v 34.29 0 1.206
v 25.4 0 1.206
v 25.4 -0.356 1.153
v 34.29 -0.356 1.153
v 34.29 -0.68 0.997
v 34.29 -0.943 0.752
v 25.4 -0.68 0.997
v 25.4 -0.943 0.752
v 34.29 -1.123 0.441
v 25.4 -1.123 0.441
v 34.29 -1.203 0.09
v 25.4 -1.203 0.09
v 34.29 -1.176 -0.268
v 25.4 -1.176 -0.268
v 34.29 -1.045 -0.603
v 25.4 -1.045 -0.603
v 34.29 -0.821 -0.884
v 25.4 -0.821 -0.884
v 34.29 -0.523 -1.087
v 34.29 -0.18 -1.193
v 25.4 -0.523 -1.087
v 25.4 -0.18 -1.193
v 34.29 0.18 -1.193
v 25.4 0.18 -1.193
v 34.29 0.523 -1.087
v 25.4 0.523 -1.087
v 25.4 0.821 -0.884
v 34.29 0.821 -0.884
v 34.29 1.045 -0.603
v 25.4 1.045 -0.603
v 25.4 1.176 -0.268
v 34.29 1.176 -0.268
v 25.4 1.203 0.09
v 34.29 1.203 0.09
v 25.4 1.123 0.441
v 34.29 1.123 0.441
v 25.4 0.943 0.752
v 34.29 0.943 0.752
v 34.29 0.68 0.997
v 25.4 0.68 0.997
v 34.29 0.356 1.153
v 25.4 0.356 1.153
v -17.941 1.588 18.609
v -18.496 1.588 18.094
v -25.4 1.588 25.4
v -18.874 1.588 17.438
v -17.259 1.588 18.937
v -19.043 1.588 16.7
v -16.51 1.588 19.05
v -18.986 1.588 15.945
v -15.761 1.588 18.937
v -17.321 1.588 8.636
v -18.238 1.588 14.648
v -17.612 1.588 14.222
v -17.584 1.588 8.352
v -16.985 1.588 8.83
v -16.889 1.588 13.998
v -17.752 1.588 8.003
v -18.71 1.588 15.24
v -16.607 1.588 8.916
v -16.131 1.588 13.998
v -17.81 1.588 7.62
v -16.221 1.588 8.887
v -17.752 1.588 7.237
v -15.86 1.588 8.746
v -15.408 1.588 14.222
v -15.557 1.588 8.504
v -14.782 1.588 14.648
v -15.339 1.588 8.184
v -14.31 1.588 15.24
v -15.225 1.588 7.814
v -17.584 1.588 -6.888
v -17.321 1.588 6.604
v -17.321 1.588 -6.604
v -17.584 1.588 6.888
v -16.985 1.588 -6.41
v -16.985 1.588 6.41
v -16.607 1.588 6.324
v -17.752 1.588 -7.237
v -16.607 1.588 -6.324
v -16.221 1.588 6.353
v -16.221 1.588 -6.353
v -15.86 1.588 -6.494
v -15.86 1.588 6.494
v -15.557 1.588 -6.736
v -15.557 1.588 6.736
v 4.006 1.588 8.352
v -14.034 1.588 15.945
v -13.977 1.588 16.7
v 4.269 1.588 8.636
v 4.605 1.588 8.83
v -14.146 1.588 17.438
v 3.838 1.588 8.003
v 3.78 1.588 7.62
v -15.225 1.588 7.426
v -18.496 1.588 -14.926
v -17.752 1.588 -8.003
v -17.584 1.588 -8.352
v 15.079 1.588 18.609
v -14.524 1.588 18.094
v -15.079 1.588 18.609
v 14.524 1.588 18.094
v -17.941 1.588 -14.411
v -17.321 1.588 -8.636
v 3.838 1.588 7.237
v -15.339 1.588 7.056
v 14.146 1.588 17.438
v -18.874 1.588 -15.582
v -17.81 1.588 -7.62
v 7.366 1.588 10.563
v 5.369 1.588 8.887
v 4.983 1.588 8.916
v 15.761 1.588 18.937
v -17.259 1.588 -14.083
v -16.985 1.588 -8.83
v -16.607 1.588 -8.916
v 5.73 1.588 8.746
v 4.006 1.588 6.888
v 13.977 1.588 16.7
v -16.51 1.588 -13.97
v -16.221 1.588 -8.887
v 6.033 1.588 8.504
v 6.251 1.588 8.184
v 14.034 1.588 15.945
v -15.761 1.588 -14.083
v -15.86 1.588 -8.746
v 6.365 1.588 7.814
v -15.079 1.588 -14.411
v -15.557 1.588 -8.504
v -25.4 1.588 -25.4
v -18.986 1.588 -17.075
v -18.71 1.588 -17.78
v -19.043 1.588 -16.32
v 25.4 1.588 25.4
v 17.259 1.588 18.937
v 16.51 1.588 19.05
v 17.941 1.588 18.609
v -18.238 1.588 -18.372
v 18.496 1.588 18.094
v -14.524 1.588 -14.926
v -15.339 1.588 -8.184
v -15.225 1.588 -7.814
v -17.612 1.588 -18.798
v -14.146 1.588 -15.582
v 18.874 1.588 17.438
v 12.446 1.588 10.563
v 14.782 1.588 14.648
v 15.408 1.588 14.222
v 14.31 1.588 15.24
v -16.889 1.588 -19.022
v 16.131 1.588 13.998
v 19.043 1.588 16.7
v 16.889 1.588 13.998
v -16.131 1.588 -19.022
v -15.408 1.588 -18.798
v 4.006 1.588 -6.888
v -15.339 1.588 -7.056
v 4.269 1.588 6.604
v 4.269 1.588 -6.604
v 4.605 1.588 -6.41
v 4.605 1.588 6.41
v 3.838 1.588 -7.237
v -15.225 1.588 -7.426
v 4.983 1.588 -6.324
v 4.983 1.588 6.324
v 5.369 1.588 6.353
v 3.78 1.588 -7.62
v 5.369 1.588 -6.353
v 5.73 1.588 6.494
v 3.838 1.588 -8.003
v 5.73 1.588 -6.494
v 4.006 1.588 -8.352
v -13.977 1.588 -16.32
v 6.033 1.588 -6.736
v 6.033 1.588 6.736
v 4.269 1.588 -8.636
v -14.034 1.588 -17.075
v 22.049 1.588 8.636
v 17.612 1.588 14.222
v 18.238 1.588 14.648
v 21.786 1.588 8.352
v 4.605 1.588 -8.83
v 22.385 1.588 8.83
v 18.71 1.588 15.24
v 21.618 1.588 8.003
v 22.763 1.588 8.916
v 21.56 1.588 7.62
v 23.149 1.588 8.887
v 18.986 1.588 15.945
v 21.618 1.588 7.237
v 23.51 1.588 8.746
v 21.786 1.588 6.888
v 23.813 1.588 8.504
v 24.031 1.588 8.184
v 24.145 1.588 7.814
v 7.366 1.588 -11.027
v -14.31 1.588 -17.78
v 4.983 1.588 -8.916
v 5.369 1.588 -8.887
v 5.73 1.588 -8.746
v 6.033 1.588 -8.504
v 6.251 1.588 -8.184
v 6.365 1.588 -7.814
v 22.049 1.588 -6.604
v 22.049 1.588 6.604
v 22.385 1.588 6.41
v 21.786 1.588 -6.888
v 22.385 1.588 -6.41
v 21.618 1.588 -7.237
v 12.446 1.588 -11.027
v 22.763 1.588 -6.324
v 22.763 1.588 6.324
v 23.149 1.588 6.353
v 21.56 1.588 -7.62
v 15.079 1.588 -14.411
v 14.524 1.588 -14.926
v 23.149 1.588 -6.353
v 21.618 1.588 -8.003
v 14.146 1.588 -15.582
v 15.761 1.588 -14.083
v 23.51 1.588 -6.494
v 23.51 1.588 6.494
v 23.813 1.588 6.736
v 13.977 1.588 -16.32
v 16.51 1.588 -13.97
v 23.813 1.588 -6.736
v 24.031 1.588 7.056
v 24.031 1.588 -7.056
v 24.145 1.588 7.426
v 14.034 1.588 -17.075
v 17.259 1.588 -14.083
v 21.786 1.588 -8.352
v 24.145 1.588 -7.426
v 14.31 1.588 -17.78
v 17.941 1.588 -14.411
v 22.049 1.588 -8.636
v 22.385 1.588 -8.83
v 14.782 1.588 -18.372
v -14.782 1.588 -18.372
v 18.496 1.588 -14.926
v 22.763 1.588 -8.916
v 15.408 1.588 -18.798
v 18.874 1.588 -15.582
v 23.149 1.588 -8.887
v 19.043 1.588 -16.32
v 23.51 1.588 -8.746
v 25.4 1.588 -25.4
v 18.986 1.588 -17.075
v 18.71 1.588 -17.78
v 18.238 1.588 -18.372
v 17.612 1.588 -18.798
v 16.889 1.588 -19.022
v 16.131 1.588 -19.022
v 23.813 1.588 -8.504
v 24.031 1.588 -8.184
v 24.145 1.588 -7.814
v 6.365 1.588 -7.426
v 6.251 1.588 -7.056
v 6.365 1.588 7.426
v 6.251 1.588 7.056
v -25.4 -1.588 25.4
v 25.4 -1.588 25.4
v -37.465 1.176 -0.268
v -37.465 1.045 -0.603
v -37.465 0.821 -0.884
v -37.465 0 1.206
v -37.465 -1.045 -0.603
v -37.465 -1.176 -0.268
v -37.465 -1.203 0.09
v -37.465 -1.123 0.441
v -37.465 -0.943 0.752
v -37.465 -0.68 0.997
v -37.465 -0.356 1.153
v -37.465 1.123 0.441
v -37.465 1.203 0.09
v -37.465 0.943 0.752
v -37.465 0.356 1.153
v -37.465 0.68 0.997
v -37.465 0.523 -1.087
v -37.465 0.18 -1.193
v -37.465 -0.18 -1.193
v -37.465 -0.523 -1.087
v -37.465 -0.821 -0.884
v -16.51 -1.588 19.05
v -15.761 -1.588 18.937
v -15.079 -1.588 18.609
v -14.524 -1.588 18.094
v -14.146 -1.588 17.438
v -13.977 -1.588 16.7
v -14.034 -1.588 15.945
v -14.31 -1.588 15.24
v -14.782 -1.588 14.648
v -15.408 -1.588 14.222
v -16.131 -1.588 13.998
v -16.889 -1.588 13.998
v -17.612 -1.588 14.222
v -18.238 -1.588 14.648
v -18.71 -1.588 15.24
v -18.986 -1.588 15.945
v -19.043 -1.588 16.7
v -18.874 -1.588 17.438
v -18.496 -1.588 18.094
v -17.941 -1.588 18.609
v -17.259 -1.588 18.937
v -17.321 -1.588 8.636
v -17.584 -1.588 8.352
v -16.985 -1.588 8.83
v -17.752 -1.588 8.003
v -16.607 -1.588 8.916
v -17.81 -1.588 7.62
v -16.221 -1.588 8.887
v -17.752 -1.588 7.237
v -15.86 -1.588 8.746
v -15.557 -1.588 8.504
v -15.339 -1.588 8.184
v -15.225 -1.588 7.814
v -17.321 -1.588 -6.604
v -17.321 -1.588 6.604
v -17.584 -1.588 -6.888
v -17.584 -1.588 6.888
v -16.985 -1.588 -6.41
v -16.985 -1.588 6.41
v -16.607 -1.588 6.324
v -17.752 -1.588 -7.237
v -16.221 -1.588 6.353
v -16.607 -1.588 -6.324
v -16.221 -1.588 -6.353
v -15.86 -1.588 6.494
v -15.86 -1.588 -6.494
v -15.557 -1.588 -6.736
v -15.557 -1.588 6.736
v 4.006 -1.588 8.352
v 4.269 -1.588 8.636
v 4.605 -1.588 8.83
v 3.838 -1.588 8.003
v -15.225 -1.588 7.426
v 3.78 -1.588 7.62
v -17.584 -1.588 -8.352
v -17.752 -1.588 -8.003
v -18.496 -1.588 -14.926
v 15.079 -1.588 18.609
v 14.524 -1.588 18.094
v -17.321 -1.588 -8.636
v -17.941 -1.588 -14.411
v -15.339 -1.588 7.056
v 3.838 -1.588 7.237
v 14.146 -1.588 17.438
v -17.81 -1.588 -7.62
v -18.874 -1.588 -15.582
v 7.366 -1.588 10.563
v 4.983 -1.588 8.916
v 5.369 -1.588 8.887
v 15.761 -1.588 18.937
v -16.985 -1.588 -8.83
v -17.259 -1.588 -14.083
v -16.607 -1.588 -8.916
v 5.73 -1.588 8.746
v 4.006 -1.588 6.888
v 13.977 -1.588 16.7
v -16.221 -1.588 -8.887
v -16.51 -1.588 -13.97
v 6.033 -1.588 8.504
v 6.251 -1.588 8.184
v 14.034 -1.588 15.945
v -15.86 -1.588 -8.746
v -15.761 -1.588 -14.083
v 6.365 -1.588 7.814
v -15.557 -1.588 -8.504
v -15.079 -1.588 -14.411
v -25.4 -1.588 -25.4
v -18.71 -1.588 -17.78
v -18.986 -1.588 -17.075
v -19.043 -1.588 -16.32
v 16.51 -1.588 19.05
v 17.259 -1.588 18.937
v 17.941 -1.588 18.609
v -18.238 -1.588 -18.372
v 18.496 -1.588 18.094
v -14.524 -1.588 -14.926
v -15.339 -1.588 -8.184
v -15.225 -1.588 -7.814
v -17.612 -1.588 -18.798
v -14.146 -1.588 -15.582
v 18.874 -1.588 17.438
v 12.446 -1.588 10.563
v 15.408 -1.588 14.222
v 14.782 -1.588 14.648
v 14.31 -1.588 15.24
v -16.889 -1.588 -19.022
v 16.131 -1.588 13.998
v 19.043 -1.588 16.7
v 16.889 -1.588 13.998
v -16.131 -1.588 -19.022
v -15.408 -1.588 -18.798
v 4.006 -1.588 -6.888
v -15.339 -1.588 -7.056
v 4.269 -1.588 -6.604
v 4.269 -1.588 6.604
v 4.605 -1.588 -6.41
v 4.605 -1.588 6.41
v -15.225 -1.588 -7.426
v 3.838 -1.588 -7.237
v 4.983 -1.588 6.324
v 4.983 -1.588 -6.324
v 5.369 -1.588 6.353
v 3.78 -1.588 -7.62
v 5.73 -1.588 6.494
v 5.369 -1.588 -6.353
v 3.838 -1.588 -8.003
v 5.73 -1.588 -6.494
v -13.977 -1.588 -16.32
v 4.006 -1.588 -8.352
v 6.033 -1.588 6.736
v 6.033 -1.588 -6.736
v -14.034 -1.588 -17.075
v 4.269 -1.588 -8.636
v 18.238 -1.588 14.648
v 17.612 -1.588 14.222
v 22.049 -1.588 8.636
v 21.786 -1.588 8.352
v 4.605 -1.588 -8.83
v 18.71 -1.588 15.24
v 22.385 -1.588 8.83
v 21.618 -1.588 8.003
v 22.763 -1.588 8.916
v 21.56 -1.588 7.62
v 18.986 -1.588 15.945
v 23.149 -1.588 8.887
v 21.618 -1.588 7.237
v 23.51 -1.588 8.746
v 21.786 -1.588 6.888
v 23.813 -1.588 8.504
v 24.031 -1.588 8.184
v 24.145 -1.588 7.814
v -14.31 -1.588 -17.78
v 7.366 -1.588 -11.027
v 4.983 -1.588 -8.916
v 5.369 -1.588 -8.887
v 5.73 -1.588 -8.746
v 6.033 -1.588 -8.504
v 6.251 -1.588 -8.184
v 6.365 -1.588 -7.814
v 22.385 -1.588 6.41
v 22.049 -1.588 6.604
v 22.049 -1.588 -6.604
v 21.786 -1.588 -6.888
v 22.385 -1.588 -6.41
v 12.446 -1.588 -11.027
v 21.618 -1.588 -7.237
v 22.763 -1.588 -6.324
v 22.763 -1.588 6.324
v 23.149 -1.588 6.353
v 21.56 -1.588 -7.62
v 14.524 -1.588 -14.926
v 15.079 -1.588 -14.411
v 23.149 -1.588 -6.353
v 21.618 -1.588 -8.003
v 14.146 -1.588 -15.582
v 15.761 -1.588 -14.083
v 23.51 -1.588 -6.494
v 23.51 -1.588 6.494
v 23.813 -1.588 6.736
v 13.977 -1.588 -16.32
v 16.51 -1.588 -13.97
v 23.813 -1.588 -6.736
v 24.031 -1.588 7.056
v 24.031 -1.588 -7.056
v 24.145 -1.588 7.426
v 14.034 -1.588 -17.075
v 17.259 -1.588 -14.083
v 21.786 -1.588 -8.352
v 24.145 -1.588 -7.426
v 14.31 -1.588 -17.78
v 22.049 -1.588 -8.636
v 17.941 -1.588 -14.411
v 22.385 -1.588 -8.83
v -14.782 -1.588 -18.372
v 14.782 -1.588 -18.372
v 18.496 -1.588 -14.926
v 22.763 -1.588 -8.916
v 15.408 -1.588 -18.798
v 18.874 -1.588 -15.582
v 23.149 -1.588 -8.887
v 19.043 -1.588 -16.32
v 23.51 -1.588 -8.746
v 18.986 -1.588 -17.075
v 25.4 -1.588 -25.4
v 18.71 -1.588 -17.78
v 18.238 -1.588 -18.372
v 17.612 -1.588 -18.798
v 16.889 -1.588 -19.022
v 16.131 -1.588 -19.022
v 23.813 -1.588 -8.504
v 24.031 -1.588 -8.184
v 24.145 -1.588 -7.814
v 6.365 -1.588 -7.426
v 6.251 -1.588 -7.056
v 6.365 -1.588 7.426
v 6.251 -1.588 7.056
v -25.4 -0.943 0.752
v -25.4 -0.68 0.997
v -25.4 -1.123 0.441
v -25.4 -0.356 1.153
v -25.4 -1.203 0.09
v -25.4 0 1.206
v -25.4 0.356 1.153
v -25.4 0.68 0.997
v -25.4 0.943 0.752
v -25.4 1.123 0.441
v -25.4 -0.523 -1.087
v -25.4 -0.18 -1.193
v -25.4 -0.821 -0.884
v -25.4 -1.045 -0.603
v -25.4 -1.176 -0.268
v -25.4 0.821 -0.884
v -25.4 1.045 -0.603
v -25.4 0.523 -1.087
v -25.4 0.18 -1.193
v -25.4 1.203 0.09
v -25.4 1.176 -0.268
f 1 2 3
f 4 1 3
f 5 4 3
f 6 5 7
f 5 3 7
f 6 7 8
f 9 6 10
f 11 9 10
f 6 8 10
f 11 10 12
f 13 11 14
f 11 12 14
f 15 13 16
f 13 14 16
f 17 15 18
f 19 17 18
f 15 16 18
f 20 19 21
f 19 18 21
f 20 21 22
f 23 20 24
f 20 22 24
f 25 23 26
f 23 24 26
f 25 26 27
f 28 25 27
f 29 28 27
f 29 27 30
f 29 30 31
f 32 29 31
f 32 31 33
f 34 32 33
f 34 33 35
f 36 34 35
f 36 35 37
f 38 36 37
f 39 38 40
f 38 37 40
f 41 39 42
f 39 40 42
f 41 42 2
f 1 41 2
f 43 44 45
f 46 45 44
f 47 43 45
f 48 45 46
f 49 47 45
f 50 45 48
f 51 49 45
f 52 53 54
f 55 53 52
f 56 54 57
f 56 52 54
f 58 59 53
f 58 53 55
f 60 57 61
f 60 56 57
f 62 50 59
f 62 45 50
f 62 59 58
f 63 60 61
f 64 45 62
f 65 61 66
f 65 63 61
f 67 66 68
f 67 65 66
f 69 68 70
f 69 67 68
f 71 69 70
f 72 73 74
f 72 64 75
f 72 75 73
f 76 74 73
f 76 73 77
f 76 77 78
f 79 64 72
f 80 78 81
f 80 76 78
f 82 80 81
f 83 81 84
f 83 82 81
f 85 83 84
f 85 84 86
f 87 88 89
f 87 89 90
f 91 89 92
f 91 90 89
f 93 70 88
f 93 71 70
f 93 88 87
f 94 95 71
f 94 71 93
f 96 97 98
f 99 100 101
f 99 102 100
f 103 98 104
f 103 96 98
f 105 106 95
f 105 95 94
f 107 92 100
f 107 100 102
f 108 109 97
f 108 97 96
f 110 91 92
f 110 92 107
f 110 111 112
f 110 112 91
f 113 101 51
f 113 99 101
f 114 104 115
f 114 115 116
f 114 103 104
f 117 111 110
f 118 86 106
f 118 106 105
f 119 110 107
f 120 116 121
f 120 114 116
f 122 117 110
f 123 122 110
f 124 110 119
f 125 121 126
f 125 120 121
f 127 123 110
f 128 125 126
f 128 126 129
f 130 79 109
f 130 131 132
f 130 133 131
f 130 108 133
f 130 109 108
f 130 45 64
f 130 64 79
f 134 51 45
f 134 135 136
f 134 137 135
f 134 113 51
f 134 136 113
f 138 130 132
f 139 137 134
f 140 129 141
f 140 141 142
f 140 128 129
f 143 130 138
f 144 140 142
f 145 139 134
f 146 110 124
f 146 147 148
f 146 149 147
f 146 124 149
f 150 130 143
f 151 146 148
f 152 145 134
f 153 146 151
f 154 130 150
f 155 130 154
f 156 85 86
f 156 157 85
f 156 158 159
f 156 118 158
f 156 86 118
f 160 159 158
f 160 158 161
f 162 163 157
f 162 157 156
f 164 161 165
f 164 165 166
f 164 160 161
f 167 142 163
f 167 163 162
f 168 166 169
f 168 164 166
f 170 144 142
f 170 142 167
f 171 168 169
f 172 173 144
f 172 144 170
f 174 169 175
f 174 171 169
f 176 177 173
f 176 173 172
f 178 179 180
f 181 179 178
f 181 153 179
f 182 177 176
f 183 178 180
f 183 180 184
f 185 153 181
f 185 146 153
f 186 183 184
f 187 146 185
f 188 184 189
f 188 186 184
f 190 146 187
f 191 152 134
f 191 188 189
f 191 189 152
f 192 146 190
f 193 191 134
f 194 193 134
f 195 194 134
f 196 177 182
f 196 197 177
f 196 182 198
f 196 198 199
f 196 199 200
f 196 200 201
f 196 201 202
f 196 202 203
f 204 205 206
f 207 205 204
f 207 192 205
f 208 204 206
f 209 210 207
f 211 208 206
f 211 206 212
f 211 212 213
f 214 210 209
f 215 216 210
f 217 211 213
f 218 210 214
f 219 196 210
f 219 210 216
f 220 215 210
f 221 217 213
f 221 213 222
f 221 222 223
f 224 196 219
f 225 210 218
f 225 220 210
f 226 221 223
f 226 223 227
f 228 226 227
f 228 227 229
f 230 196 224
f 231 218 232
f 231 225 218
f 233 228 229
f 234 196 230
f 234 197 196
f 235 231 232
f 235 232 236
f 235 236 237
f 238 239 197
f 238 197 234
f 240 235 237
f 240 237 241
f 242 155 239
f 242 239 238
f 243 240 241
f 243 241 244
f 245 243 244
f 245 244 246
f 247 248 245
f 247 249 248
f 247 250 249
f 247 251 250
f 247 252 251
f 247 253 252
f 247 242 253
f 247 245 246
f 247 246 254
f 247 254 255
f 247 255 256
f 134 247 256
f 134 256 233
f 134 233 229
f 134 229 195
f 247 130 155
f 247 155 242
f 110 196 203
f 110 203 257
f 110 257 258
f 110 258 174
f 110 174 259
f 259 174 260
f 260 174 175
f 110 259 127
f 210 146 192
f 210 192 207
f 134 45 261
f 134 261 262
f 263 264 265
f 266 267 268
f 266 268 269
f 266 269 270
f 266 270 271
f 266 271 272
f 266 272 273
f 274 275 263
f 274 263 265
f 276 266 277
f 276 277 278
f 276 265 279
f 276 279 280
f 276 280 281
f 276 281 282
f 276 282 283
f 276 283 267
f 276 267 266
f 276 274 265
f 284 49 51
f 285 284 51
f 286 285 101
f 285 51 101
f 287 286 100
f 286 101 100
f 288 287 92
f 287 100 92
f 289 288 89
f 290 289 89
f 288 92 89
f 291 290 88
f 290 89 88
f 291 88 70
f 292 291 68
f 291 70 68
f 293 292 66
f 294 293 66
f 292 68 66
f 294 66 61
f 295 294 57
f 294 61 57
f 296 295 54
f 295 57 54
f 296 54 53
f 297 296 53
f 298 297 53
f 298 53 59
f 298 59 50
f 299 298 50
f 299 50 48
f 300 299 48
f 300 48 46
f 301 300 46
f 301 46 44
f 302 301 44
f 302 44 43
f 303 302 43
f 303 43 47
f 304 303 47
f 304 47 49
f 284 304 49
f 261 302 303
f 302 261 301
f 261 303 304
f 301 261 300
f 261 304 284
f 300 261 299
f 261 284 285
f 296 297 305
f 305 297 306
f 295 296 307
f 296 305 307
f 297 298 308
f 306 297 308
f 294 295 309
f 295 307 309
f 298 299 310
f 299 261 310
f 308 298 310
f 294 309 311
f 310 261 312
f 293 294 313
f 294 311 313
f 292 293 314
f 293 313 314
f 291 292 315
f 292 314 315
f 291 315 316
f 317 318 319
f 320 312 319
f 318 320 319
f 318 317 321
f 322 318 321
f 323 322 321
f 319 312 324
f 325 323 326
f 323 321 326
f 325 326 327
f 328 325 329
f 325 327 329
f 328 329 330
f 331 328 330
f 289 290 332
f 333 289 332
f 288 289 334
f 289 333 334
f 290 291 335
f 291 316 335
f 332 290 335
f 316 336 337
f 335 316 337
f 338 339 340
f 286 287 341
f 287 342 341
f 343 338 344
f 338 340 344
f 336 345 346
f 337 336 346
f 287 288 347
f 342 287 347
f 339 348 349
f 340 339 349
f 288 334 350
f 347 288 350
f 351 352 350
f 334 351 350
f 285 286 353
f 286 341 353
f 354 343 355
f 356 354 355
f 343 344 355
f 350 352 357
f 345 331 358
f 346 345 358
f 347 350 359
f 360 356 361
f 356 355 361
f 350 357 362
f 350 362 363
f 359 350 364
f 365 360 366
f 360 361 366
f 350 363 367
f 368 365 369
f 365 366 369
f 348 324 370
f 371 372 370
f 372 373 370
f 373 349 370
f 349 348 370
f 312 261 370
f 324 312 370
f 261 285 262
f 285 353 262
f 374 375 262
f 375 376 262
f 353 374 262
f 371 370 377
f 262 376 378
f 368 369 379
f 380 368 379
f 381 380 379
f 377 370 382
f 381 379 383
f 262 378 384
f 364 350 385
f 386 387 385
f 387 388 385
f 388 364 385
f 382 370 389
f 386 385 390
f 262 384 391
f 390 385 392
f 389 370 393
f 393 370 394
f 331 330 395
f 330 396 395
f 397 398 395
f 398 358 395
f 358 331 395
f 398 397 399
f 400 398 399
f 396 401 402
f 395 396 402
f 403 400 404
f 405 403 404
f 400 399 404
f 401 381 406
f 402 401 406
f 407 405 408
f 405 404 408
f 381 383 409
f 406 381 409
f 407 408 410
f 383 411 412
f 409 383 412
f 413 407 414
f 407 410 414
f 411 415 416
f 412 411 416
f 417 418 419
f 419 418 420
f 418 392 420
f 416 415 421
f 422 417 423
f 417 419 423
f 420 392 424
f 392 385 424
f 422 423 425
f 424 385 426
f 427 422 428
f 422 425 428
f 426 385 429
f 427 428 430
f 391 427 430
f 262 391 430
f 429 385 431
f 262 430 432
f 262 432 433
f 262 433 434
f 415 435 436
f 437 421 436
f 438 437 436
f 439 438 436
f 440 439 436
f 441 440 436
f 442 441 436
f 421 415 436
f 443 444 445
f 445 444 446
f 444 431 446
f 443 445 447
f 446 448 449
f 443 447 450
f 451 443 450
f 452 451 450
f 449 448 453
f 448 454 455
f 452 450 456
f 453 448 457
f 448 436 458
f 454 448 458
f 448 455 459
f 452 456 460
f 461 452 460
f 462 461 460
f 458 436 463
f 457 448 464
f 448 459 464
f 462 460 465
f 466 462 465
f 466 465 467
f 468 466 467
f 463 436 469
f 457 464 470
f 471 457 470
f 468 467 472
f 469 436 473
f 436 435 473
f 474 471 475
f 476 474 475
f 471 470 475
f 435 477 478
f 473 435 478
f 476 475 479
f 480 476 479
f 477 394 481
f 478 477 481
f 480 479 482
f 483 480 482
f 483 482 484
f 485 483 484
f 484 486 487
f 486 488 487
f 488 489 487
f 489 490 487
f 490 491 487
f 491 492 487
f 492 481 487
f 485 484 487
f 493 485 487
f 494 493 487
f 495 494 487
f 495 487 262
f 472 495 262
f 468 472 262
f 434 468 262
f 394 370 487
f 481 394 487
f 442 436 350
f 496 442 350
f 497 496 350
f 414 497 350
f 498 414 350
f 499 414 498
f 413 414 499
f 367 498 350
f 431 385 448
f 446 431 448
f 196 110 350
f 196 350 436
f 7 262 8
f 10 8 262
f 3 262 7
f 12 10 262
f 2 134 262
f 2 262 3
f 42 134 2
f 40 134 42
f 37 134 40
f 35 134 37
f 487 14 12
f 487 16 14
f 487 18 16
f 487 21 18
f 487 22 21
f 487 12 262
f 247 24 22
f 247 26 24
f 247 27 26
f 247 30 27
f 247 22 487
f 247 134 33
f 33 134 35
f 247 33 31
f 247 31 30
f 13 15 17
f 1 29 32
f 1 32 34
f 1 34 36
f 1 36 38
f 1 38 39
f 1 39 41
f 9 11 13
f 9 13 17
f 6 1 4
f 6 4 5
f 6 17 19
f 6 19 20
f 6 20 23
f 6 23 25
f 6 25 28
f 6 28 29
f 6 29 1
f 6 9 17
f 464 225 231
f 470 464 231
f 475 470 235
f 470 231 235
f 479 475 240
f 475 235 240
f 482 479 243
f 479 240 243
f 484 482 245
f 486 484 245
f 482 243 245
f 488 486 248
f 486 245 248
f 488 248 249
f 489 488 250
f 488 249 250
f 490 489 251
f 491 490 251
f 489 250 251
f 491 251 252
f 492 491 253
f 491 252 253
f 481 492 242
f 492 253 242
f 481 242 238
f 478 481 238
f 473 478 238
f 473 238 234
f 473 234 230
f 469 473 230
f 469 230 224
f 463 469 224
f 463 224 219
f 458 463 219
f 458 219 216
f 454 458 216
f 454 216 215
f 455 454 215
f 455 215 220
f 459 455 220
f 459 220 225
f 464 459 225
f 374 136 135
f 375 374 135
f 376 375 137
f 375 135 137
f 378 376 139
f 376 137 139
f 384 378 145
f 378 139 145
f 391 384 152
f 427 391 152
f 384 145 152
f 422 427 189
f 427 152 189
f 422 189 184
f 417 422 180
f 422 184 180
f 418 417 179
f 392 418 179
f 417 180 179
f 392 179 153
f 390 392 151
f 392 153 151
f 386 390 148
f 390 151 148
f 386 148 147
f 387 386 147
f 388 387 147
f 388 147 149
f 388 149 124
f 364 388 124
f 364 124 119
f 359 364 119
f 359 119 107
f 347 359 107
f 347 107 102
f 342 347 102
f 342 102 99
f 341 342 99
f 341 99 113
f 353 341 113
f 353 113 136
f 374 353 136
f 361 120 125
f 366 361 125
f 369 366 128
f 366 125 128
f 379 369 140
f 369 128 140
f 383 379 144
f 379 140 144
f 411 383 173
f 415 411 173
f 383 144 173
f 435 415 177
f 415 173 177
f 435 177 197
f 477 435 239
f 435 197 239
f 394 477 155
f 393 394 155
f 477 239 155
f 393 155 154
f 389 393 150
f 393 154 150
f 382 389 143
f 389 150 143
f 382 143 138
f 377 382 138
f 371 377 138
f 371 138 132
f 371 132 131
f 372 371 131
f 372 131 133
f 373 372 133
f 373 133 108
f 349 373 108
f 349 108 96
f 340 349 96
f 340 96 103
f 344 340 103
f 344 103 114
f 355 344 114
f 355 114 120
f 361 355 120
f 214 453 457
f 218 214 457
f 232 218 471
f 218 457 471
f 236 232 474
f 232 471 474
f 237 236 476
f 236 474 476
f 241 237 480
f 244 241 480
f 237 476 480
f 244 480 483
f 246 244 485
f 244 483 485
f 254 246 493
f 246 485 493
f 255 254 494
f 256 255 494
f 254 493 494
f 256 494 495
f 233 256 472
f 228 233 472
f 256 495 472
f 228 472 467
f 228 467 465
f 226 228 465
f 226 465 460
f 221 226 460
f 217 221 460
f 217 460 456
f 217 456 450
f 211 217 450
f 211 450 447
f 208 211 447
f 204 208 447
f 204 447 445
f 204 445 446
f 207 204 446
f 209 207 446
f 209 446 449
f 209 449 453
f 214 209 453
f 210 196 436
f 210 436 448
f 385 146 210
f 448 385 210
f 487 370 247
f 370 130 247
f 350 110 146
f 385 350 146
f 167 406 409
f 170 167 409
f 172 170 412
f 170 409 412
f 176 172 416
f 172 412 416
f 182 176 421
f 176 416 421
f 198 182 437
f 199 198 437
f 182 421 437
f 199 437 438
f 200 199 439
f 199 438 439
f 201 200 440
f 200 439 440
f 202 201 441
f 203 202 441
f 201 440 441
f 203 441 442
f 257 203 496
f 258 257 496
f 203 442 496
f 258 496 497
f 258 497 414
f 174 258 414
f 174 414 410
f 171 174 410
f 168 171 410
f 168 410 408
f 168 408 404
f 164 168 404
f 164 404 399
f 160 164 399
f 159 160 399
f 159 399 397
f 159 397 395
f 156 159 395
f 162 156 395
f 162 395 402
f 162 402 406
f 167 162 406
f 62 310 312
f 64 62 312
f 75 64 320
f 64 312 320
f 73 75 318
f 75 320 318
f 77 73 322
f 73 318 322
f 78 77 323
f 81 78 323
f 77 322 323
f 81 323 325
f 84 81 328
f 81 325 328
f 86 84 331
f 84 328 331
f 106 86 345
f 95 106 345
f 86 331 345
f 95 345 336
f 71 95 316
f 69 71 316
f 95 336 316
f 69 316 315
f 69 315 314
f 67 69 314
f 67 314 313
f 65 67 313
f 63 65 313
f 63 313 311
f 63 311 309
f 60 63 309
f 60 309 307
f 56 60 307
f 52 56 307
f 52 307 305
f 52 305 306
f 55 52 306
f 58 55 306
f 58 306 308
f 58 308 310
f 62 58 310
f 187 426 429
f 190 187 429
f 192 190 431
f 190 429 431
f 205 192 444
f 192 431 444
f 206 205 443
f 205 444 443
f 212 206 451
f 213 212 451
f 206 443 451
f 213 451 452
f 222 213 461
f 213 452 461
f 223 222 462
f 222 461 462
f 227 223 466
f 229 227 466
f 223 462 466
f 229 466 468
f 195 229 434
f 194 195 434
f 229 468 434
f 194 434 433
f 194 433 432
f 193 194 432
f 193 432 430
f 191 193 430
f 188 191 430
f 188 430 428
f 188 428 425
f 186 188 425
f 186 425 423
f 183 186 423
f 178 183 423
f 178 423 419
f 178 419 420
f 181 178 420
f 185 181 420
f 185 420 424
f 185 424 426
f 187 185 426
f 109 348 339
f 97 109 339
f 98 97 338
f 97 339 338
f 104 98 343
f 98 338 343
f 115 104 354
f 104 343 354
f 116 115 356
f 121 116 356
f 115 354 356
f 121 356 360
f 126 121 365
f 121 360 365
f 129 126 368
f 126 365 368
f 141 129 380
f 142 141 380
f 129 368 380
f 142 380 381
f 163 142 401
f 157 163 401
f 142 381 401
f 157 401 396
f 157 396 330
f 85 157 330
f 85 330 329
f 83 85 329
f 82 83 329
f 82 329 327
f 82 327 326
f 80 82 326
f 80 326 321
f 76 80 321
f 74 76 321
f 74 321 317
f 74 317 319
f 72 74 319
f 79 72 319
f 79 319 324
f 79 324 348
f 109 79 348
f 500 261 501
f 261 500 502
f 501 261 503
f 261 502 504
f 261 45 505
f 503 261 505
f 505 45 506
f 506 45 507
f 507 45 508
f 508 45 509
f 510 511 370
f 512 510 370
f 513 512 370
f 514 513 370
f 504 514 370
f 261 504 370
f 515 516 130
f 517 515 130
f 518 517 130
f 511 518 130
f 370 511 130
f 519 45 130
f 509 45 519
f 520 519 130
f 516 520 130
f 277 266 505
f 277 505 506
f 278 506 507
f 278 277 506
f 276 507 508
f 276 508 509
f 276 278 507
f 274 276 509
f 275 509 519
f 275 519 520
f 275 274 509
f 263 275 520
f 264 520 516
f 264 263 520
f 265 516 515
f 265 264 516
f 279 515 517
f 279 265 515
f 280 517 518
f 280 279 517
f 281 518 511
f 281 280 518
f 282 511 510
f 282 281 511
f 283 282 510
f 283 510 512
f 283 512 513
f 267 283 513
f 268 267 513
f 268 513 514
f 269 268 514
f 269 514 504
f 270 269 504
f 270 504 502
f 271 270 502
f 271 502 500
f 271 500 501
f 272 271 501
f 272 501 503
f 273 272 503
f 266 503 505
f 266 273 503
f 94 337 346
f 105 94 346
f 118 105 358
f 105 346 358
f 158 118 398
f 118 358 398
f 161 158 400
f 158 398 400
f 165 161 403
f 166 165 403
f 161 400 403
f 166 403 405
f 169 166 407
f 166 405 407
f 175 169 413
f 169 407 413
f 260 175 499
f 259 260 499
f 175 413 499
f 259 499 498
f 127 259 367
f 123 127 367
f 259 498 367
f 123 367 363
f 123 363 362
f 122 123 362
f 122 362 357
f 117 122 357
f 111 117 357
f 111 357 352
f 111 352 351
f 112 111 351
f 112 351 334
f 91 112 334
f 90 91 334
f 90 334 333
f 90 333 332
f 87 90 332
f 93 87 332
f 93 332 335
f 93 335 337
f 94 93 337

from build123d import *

# Parameters (mm, degrees)
SKETCH1_W            = 50.8
SKETCH1_H            = 50.8
BOSS_EXTRUDE1_DEPTH  = 1.5875
SKETCH3_R            = 1.2065
BOSS_EXTRUDE2_DEPTH  = 8.89
SKETCH4_R            = 2.54
CUT_EXTRUDE1_DEPTH   = 43.790708396
BOSS_EXTRUDE3_START  = 12.065
SKETCH5_R            = 1.2065
BOSS_EXTRUDE3_DEPTH  = 12.065
M2_CLEARANCE_HOLE1_D = 2.6
CUT_EXTRUDE2_REACH   = 47.375
SKETCH8_W            = 5.08
SKETCH8_H            = 21.59


with BuildPart() as part:
    # Sketch1 → Boss-Extrude1 (new, symmetric)
    with BuildSketch(Plane(origin=(0, 0, 0), x_dir=(1, 0, 0), z_dir=(0, 1, 0))):
        Rectangle(SKETCH1_W, SKETCH1_H)
    extrude(amount=BOSS_EXTRUDE1_DEPTH, both=True)

    # Sketch3 → Boss-Extrude2 (add)
    with BuildSketch(Plane(origin=(25.4, 0, 0), x_dir=(0, 0, -1), z_dir=(1, 0, 0))):
        with Locations(Location((0, 0, 0), (0, 0, 180))):
            Circle(SKETCH3_R)
    extrude(amount=BOSS_EXTRUDE2_DEPTH)

    # Sketch4 → Cut-Extrude1 (cut, through all)
    with BuildSketch(Plane(origin=(0, 1.5875, 0), x_dir=(1, 0, 0), z_dir=(0, 1, 0))):
        with Locations(Location((-16.51, 16.51, 0), (0, 0, 270))):
            Circle(SKETCH4_R)
        with Locations(Location((16.51, 16.51, 0), (0, 0, 270))):
            Circle(SKETCH4_R)
        with Locations(Location((16.51, -16.51, 0), (0, 0, 270))):
            Circle(SKETCH4_R)
        with Locations(Location((-16.51, -16.51, 0), (0, 0, 270))):
            Circle(SKETCH4_R)
    extrude(amount=-CUT_EXTRUDE1_DEPTH, mode=Mode.SUBTRACT)

    # Sketch5 → Boss-Extrude3 (add)
    with BuildSketch(Plane.ZY.offset(25.4).offset(BOSS_EXTRUDE3_START)):
        Circle(SKETCH5_R)
    extrude(amount=-BOSS_EXTRUDE3_DEPTH)

    # M2 Clearance Hole1 (through all)
    with Locations(Plane(origin=(0, 1.5875, 0), x_dir=(1, 0, 0), z_dir=(0, 1, 0))):
        with Locations((-16.51, -7.62), (-16.51, 7.62), (5.08, -7.62), (5.08, 7.62), (22.86, 7.62), (22.86, -7.62)):
            Hole(M2_CLEARANCE_HOLE1_D / 2)

    # Sketch8 → Cut-Extrude2 (cut, up to next)
    with BuildSketch(Plane(origin=(0, 1.5875, 0), x_dir=(1, 0, 0), z_dir=(0, 1, 0)), mode=Mode.PRIVATE) as cut_extrude2_sk1:
        with Locations((9.906, 0.232205857)):
            Rectangle(SKETCH8_W, SKETCH8_H)
    cut_extrude2_tool1 = extrude(cut_extrude2_sk1.sketch, amount=-CUT_EXTRUDE2_REACH, mode=Mode.PRIVATE) & part.part
    add(cut_extrude2_tool1.solids().sort_by_distance((9.906, 1.5875, -0.232206))[0], mode=Mode.SUBTRACT)


solid = part.part
